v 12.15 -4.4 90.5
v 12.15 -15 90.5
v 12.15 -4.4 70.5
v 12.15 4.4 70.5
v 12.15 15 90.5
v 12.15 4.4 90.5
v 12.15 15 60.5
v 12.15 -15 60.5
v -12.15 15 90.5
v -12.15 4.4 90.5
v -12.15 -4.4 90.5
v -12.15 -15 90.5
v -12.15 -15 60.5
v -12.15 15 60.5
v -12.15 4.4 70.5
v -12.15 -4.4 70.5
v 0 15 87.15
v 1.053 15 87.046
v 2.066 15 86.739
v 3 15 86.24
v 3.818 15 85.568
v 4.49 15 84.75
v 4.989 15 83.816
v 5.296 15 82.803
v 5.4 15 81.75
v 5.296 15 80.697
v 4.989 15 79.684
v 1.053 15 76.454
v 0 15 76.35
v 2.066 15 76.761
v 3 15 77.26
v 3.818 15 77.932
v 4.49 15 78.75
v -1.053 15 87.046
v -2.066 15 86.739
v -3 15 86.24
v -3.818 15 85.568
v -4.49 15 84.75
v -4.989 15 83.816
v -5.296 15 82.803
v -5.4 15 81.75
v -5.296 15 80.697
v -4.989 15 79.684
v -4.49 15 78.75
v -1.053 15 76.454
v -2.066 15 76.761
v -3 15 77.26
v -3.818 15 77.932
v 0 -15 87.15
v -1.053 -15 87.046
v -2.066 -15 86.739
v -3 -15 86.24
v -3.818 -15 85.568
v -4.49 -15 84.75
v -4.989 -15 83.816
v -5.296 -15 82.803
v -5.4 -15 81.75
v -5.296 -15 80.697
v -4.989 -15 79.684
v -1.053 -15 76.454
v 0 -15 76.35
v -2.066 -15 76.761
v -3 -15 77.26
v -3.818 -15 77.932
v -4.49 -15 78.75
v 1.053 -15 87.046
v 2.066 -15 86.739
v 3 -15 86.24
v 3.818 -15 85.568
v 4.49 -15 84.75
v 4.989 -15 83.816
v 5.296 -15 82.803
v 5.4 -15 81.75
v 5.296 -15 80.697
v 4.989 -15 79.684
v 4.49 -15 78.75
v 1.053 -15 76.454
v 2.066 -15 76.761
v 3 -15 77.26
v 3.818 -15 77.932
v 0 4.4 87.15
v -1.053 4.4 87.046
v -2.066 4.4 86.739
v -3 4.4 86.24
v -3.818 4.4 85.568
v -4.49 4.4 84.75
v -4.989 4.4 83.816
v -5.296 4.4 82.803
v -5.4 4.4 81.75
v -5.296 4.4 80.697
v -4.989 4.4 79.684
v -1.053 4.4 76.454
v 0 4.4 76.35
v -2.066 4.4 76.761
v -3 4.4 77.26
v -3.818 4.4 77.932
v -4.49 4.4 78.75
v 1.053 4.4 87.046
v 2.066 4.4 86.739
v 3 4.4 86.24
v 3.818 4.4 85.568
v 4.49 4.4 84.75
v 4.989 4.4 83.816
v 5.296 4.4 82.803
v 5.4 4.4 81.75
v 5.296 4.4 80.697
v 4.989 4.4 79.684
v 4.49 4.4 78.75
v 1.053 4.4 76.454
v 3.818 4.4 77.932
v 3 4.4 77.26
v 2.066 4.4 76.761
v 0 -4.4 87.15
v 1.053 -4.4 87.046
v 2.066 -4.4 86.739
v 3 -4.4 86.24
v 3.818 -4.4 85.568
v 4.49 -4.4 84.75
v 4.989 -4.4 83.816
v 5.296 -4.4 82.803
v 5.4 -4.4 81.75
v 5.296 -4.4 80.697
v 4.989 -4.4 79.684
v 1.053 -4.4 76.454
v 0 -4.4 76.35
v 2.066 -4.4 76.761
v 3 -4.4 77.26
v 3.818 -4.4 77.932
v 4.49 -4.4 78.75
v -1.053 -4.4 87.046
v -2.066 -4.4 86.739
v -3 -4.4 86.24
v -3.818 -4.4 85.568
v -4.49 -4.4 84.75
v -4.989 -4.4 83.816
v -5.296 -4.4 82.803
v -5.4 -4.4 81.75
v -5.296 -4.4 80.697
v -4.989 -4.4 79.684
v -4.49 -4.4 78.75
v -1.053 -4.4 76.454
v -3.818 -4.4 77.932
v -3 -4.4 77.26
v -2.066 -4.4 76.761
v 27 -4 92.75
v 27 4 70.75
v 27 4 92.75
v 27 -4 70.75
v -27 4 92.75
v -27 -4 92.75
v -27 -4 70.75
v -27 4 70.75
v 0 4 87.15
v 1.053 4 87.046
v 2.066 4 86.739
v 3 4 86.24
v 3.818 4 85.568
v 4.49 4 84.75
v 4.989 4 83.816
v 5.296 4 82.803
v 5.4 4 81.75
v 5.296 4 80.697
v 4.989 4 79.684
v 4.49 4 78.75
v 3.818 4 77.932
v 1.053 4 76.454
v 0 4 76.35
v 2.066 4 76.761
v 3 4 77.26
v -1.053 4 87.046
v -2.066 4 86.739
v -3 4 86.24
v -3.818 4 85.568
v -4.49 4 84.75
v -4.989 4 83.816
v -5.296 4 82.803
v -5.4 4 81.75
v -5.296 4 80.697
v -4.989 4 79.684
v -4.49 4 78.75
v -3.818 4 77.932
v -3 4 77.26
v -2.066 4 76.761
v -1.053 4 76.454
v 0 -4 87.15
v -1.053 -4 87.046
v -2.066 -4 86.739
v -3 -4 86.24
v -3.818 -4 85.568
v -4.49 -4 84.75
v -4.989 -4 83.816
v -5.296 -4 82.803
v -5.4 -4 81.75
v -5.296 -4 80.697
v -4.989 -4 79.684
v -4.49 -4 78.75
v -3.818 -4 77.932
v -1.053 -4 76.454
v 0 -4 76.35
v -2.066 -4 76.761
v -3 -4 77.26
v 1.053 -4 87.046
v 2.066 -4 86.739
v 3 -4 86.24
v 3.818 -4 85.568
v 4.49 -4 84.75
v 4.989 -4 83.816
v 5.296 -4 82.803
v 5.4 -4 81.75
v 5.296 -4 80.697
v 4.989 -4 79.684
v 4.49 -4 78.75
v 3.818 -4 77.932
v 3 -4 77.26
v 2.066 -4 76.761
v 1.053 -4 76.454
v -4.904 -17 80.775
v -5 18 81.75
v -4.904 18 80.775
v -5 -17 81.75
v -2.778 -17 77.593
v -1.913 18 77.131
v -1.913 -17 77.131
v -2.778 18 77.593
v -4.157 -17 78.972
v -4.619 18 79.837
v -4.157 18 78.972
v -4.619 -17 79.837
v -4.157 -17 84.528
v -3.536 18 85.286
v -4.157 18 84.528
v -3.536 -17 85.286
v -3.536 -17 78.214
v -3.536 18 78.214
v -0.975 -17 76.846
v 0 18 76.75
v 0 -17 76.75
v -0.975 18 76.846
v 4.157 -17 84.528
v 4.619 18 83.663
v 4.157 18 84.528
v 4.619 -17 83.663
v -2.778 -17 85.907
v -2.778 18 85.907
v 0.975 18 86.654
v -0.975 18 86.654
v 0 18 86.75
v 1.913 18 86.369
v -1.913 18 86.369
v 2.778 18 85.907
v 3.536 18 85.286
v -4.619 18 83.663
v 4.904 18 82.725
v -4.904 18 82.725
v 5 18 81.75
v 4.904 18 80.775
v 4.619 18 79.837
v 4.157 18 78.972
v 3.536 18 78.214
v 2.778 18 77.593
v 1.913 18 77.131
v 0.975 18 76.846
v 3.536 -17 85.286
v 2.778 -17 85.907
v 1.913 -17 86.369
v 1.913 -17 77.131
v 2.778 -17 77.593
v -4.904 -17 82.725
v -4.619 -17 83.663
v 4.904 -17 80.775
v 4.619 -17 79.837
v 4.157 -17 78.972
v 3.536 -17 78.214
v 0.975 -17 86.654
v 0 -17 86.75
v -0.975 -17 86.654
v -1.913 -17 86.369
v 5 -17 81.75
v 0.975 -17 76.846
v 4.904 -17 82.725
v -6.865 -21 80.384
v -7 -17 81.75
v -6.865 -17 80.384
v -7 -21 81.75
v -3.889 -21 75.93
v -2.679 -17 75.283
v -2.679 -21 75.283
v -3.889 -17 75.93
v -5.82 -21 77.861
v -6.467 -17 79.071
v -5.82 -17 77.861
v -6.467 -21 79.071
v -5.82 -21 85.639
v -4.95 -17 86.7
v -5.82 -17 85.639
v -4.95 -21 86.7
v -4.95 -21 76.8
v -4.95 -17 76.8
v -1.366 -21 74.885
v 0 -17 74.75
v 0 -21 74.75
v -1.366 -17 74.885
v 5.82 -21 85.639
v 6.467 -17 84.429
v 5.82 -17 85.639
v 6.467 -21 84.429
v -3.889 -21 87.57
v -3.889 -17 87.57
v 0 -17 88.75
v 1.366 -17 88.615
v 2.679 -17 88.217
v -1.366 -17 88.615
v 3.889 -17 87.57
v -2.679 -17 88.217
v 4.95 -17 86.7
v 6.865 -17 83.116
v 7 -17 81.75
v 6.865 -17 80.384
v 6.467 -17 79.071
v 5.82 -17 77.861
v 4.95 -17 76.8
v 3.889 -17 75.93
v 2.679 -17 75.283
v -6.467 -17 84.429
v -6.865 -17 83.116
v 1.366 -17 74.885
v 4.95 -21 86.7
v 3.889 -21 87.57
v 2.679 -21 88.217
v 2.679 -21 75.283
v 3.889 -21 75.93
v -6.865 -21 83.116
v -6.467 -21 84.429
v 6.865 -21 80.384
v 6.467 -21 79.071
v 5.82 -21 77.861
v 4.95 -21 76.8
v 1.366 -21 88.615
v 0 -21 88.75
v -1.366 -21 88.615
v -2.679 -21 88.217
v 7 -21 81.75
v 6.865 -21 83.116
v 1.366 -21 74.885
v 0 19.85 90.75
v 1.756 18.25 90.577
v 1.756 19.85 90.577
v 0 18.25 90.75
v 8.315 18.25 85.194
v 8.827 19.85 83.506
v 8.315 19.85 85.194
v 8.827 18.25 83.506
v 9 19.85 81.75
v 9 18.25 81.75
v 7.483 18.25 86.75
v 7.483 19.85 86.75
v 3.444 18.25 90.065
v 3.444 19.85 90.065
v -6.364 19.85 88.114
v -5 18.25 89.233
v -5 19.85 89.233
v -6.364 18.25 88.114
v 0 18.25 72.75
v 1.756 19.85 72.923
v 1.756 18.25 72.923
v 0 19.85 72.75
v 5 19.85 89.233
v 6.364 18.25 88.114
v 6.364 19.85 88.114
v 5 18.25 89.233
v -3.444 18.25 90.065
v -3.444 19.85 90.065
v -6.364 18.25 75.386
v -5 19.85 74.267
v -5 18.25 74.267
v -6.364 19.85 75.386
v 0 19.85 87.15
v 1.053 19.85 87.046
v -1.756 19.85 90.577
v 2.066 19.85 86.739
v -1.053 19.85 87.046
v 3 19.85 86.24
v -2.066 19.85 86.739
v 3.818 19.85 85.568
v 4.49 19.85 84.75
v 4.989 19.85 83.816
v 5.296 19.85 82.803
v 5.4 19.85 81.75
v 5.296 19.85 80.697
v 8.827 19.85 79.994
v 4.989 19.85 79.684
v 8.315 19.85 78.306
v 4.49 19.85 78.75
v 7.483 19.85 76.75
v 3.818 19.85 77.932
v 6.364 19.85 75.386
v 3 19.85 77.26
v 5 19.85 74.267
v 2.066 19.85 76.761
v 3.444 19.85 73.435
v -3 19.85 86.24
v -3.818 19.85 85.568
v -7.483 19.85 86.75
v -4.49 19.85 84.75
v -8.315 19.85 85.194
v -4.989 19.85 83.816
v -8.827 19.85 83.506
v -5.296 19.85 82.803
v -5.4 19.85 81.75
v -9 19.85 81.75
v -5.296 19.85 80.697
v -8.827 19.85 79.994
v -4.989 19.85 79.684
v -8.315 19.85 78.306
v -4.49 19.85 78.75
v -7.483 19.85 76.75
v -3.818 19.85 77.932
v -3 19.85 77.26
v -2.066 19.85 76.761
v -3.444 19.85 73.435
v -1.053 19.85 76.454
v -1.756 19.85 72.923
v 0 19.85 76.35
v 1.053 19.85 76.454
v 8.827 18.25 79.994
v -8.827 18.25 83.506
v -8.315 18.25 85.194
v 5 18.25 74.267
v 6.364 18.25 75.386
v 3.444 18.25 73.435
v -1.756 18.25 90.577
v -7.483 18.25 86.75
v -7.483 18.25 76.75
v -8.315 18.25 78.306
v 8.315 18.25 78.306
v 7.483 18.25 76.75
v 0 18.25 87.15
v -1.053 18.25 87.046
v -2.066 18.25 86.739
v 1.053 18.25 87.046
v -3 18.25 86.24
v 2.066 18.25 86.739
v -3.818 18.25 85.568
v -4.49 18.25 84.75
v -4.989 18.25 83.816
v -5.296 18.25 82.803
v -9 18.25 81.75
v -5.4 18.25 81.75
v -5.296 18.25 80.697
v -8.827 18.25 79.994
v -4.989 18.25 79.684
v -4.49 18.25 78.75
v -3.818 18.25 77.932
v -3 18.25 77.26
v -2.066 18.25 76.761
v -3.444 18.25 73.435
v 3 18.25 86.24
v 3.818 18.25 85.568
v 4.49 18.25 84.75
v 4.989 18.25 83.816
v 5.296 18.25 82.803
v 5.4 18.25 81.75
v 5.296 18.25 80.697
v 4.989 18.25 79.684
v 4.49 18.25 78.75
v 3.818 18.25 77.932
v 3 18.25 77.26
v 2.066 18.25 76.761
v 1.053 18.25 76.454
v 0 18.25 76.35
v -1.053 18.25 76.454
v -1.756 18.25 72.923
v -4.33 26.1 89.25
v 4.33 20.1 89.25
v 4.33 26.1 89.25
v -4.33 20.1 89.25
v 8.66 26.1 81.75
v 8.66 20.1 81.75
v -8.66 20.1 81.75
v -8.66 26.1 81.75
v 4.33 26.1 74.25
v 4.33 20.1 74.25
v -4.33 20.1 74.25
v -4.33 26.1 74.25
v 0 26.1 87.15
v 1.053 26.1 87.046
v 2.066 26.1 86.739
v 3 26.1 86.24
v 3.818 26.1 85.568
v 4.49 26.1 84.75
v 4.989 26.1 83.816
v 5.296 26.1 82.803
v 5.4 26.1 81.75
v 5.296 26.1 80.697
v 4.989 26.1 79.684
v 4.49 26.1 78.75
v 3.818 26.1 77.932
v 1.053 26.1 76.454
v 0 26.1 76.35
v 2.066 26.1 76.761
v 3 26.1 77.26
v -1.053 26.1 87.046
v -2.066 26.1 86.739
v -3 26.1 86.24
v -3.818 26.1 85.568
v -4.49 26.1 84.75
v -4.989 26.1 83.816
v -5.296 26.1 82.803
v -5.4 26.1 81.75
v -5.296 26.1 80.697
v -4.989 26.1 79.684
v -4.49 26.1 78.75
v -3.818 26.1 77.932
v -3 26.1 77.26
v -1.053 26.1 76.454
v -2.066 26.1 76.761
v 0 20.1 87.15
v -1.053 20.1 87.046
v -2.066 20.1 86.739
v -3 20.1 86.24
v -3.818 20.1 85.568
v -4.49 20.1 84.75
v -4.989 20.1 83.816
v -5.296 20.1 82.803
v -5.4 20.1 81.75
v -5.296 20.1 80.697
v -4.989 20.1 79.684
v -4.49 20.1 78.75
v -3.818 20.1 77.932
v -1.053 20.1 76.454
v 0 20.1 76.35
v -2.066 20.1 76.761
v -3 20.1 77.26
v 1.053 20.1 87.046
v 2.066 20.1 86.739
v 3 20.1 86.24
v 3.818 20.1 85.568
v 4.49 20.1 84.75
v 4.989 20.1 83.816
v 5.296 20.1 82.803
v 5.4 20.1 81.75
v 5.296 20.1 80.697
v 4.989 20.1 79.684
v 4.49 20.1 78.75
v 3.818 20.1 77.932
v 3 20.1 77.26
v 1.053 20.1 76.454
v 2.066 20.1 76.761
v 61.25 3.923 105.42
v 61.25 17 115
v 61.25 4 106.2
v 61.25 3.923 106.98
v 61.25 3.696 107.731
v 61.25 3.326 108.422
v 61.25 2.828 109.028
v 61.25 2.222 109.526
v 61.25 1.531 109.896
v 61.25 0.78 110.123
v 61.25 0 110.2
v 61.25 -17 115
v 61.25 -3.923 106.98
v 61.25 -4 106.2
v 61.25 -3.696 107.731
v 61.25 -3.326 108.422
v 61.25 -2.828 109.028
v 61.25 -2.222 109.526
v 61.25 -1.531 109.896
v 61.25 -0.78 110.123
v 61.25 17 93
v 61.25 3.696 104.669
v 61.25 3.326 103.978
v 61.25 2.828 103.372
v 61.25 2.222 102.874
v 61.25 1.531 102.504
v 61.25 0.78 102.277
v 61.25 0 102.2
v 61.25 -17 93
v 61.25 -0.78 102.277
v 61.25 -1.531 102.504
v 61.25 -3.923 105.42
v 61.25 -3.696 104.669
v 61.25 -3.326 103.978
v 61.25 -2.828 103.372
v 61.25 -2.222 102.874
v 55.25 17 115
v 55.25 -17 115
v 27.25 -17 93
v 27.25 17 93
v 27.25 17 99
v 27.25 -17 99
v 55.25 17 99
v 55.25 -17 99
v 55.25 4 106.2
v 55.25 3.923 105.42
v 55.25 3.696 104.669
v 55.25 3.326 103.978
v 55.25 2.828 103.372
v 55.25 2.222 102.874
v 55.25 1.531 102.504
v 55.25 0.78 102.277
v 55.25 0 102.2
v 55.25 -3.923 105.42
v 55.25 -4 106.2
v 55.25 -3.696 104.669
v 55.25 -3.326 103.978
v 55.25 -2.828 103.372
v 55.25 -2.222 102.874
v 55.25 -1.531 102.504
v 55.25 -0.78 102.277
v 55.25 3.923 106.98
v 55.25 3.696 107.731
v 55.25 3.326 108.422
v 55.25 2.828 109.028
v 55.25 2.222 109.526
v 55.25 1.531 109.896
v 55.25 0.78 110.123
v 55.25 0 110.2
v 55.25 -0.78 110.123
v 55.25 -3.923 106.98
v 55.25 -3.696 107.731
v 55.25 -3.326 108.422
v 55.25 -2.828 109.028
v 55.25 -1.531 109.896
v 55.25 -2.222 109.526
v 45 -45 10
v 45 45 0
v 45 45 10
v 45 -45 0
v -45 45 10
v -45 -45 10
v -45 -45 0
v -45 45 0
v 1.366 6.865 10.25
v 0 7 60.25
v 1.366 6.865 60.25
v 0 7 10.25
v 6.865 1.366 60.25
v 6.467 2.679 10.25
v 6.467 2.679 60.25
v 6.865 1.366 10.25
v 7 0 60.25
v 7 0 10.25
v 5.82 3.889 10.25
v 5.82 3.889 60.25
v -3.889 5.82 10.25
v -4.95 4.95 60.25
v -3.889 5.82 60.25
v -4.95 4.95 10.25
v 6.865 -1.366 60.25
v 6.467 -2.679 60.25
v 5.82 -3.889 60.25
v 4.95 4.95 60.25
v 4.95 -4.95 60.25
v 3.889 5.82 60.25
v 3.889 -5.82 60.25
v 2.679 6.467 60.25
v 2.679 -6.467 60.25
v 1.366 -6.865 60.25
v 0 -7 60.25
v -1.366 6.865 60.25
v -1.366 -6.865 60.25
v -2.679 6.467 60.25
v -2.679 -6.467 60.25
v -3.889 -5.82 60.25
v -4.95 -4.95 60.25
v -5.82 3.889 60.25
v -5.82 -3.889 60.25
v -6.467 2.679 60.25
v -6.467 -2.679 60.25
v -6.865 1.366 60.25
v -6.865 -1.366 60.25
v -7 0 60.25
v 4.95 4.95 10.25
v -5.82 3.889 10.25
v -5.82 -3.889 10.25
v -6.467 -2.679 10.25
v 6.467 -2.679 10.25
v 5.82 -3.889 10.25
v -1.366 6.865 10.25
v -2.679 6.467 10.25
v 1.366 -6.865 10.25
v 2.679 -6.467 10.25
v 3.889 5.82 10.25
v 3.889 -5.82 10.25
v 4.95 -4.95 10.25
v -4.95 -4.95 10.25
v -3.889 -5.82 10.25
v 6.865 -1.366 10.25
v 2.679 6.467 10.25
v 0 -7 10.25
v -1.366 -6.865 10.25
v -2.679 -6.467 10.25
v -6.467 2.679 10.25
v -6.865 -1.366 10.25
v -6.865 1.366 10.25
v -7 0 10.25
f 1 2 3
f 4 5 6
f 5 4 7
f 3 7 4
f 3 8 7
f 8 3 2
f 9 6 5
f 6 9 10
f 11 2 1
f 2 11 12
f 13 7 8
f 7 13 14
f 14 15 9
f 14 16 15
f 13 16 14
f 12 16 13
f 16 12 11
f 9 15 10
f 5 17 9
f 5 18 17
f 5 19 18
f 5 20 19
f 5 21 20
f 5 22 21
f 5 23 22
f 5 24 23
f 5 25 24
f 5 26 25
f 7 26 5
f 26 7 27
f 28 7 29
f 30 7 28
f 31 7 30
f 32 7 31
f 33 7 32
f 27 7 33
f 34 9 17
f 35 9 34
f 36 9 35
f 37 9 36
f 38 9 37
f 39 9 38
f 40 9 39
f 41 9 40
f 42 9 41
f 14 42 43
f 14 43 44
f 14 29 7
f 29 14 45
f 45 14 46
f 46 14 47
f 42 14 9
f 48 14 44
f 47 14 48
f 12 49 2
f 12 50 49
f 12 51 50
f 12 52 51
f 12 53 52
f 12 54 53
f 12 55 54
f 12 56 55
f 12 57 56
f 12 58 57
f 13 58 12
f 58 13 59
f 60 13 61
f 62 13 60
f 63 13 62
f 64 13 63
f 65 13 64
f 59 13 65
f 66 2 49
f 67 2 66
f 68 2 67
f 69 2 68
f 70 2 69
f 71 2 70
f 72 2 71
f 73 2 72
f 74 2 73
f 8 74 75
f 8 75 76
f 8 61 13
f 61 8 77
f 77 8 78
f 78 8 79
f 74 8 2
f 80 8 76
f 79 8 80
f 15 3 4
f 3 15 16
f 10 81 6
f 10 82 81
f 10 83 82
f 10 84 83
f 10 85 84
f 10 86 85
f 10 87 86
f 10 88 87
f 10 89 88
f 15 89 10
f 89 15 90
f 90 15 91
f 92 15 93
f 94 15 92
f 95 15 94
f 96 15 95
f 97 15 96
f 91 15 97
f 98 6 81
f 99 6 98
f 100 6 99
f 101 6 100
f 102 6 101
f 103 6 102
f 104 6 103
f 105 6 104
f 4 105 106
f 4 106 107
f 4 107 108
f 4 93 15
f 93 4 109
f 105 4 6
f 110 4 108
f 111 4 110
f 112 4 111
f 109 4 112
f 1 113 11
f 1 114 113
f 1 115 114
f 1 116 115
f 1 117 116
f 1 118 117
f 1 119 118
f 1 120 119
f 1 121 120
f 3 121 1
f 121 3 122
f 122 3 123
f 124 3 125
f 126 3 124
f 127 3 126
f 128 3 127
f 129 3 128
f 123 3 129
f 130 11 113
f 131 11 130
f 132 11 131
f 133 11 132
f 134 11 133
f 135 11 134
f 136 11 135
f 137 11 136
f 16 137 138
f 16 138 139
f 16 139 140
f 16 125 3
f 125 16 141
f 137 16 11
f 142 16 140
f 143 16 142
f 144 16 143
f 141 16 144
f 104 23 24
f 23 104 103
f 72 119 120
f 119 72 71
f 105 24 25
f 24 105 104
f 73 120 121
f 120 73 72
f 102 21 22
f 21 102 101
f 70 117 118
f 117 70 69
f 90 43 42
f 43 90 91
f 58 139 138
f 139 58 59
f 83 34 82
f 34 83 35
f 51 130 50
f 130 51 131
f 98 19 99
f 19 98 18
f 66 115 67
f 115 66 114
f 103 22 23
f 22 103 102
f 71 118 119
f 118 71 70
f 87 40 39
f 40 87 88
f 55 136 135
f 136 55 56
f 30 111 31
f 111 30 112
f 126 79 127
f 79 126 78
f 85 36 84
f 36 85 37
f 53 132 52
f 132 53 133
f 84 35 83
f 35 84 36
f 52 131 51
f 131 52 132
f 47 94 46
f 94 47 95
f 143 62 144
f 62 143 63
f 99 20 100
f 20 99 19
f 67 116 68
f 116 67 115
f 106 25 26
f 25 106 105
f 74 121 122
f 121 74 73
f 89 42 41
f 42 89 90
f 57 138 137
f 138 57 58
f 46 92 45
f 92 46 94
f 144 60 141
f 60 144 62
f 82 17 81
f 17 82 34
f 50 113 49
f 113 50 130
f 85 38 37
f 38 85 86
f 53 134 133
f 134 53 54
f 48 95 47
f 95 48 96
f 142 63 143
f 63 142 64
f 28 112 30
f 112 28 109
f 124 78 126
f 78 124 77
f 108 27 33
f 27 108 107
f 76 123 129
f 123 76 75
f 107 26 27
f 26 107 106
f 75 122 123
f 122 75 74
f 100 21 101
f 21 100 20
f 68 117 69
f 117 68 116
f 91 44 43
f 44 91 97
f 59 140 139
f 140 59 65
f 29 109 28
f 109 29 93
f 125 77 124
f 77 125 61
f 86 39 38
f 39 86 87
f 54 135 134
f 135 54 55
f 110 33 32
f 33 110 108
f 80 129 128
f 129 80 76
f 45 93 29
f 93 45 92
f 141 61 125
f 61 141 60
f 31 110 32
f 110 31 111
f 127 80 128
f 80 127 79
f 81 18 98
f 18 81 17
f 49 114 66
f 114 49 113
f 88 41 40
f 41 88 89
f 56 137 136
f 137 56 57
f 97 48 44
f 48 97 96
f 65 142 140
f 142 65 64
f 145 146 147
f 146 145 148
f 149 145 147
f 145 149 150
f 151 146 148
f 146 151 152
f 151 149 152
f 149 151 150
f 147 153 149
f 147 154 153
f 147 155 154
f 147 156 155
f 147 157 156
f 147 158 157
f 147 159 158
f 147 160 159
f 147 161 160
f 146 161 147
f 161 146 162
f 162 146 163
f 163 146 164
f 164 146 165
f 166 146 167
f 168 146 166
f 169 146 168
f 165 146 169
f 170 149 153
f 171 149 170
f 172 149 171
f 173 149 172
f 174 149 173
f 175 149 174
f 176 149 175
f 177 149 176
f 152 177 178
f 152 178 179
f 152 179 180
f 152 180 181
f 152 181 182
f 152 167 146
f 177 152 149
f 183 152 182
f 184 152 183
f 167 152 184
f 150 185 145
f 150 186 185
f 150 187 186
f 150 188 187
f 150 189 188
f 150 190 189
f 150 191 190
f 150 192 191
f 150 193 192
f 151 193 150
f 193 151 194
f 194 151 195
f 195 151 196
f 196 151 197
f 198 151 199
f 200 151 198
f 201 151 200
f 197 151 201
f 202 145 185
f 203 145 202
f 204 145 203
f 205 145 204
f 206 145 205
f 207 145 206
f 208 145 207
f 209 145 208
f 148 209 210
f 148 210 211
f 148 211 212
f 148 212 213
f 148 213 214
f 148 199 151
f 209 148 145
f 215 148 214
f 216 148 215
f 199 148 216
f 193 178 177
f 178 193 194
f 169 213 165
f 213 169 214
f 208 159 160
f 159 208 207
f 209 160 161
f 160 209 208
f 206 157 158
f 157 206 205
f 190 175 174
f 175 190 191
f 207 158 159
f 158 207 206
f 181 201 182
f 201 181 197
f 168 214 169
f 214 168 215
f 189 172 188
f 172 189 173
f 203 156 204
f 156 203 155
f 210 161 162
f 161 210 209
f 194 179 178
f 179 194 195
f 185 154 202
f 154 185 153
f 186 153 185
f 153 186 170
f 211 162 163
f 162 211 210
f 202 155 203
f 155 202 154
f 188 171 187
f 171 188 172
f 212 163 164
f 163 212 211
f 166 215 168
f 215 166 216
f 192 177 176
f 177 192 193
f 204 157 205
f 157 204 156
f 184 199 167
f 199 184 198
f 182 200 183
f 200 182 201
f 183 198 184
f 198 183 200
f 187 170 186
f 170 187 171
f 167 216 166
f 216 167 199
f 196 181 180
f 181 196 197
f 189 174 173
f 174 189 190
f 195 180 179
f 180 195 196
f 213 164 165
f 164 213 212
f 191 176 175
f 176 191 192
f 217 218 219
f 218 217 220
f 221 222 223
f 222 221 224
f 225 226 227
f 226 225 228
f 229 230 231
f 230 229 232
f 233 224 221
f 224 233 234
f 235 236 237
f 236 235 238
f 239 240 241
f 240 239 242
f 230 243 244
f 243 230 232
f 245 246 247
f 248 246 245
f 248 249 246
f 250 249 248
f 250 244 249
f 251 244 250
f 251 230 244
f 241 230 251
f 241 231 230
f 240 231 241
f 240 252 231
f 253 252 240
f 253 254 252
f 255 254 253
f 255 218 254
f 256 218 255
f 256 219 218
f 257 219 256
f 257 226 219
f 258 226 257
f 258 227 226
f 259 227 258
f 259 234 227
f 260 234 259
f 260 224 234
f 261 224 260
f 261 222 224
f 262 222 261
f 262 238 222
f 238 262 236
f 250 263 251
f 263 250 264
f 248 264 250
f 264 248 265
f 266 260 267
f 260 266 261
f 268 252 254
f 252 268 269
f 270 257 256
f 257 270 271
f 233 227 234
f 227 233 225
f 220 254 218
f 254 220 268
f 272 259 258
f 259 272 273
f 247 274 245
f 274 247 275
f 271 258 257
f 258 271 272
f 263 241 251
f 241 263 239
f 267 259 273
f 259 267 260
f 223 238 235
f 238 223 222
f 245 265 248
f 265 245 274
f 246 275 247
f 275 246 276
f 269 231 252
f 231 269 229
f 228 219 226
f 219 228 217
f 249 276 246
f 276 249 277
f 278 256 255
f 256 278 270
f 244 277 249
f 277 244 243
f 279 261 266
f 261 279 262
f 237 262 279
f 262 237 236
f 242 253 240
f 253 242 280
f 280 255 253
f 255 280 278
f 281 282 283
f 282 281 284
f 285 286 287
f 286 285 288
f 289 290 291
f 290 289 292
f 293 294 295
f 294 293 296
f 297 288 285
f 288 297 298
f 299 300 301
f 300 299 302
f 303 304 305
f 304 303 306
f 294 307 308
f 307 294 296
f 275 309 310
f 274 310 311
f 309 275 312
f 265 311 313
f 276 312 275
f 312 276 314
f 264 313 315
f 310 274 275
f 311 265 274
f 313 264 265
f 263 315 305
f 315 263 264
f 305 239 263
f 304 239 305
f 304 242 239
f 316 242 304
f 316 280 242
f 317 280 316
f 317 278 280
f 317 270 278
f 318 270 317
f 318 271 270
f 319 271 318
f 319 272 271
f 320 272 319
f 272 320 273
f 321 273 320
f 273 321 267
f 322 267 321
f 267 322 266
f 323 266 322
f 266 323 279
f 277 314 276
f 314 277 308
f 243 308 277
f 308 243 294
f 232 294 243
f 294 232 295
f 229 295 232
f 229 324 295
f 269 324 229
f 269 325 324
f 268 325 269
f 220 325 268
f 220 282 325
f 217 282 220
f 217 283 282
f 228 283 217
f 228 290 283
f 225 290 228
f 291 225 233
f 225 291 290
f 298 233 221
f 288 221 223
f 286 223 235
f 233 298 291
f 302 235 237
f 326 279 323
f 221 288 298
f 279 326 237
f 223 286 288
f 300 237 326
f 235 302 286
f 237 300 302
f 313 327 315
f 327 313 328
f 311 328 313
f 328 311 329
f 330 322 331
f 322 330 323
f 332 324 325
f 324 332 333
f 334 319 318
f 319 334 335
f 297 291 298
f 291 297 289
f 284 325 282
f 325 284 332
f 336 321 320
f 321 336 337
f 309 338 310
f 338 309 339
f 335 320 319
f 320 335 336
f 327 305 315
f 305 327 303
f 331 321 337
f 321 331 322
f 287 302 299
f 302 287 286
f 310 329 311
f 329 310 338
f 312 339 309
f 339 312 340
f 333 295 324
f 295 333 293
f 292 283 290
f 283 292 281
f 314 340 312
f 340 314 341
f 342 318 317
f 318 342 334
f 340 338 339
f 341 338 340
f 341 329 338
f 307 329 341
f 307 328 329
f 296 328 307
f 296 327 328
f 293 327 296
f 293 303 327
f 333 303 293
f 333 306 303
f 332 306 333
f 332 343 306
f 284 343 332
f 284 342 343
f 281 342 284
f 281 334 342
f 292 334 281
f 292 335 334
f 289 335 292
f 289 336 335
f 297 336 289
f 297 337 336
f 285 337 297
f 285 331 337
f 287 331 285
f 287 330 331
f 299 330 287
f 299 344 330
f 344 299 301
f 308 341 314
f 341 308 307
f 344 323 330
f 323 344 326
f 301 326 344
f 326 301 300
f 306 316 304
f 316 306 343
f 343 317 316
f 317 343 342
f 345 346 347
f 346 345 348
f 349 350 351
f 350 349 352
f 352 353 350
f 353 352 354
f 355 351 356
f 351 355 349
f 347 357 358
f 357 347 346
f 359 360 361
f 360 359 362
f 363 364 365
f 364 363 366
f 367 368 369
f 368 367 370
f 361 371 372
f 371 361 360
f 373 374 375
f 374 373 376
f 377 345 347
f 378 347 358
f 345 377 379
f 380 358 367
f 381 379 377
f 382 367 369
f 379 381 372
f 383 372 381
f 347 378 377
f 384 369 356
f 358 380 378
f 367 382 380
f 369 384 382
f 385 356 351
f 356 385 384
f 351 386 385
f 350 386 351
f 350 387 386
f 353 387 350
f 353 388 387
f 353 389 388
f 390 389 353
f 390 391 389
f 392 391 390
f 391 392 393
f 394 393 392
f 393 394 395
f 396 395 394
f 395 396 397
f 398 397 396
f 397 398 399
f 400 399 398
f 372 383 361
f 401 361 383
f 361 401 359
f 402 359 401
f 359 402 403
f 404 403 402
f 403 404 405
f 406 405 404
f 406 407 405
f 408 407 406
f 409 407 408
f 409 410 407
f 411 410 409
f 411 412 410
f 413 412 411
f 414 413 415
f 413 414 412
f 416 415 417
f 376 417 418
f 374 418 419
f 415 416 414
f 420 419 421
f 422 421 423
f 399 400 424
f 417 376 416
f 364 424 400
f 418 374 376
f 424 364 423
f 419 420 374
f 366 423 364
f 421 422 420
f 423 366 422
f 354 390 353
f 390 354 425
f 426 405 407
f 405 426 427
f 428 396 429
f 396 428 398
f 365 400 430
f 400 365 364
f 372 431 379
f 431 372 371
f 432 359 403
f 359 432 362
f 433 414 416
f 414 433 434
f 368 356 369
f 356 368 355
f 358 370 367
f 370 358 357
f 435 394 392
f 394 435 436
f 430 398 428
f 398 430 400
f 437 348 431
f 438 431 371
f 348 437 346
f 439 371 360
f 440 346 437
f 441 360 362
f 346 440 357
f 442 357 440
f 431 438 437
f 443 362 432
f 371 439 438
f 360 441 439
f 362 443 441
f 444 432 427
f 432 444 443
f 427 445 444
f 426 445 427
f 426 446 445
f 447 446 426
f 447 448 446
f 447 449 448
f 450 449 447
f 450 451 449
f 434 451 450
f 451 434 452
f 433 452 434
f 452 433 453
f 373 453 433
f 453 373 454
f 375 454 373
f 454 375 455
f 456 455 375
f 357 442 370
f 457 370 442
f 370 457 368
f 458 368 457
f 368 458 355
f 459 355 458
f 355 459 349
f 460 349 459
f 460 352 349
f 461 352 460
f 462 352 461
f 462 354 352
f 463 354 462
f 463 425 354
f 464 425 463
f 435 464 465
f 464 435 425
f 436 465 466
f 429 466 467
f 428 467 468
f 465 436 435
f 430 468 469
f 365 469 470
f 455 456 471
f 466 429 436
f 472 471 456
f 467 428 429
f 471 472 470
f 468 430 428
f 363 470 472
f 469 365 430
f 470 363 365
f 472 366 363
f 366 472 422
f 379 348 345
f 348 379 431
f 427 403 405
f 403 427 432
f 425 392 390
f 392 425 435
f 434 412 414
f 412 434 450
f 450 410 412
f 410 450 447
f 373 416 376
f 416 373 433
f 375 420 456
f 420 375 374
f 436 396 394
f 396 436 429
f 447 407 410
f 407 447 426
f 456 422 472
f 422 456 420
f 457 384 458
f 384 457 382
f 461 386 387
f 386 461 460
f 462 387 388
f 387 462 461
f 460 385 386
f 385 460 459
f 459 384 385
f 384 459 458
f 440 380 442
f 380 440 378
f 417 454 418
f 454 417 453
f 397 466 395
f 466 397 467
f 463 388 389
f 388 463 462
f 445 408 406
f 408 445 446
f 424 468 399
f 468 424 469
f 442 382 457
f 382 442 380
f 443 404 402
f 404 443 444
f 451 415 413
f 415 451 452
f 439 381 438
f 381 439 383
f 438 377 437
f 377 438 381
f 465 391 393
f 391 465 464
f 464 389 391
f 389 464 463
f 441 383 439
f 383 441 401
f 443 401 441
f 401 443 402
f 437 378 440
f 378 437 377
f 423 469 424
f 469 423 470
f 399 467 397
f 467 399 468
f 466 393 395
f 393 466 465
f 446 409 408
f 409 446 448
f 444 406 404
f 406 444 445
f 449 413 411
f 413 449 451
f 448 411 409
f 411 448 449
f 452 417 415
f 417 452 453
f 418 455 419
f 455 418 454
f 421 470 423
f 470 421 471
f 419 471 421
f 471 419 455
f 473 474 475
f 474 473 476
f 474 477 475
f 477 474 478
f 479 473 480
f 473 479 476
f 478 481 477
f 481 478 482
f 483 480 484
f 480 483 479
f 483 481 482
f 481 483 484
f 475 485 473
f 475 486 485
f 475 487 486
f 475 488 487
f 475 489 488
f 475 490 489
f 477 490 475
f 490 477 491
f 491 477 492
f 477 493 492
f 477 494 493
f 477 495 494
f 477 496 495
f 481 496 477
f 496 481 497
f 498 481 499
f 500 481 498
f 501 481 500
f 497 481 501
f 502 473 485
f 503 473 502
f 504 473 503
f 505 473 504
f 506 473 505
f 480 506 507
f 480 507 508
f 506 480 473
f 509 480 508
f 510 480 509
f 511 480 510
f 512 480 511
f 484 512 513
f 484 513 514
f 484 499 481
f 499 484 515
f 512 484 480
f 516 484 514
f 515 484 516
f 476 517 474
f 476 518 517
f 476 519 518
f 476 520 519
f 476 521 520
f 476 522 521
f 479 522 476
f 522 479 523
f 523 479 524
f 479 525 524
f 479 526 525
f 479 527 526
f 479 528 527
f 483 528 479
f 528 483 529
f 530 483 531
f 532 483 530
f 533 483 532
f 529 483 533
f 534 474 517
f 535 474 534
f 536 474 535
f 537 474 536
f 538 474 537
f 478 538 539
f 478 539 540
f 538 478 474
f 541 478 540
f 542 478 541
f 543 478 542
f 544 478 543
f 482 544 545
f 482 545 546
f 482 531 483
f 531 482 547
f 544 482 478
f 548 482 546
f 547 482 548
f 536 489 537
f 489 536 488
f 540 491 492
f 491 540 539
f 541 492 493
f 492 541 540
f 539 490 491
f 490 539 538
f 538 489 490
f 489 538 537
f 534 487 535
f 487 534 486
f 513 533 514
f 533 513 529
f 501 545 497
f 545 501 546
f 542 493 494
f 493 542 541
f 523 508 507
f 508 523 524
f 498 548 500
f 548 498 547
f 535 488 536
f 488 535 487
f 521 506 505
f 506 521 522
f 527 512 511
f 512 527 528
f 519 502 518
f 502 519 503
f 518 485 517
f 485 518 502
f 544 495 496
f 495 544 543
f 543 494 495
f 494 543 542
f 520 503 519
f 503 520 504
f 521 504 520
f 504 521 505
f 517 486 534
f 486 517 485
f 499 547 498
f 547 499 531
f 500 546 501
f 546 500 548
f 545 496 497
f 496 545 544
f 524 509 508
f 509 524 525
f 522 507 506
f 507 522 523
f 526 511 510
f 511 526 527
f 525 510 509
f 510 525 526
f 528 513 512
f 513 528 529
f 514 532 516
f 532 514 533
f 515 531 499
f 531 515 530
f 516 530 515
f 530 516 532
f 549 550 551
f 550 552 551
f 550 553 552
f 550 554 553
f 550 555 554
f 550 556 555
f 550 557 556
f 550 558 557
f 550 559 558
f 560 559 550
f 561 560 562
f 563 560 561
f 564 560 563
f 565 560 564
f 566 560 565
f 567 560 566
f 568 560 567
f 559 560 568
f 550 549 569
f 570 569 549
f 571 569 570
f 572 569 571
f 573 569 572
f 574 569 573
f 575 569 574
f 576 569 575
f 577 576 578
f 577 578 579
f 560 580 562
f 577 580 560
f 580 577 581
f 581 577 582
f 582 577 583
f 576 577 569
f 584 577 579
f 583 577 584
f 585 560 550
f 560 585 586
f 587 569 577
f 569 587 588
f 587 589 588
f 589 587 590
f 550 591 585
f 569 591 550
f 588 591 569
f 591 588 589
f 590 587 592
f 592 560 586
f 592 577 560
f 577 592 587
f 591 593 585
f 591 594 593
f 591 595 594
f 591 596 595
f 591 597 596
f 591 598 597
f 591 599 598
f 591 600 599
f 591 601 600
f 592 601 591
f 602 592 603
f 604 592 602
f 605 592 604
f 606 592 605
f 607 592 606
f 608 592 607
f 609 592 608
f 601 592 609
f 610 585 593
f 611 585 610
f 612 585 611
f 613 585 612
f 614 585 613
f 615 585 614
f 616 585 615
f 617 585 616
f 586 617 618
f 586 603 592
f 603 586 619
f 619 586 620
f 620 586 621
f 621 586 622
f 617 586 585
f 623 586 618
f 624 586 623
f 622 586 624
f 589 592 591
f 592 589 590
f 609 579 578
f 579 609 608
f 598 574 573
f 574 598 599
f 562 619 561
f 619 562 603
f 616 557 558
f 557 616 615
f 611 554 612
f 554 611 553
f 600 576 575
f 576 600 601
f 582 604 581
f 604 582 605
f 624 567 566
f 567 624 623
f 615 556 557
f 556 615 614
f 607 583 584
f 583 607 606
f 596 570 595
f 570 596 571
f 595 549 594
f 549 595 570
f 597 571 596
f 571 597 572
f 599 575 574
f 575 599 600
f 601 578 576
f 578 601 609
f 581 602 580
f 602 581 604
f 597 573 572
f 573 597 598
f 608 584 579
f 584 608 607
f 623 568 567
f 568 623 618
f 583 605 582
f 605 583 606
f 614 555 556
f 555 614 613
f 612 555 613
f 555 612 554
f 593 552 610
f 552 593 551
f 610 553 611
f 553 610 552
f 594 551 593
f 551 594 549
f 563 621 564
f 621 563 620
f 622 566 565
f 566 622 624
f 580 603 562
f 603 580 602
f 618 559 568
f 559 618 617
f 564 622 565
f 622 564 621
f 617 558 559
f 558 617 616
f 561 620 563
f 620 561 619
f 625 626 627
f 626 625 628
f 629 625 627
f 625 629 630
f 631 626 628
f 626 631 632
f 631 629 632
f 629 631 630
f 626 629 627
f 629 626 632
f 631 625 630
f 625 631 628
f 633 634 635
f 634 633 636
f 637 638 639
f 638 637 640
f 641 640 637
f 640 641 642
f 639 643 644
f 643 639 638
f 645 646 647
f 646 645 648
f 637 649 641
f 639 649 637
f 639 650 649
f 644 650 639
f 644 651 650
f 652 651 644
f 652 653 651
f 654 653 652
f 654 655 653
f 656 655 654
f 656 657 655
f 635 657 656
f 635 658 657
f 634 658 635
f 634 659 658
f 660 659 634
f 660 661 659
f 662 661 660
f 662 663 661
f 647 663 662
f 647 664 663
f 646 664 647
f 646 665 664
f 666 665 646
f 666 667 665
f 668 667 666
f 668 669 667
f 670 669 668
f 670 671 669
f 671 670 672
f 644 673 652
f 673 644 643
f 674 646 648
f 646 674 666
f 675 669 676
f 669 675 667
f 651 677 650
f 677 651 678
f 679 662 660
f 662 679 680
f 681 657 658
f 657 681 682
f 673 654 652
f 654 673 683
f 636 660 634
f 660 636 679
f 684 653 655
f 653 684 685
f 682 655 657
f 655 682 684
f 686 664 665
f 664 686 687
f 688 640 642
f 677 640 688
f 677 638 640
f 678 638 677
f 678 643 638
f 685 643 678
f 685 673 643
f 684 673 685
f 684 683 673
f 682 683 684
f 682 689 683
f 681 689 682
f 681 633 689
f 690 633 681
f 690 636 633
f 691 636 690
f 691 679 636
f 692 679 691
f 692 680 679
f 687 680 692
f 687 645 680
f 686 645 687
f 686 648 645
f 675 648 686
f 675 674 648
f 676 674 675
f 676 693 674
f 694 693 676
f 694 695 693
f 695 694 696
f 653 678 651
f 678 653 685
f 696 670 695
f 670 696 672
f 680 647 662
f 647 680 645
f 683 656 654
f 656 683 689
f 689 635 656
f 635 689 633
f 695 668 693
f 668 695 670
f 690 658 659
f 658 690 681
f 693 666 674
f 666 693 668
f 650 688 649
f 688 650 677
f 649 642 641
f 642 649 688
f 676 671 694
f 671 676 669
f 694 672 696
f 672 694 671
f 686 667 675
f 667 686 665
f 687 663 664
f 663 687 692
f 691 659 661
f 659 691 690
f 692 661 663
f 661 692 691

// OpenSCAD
$fn = 32;

// ------------------------------------------------------------------------
// Lamp arm: column d14 x 50 mm, arm 54 mm
// Every part is its own module, assembly() places every instance.
// ------------------------------------------------------------------------

// --- part 1 ---
module lamp_base() {
  difference() {
    translate([-45, -45, 0]) cube([90, 90, 10]);
  }
}

// --- part 2 ---
module lamp_column() {
  cylinder(h = 50, d = 14);
}

// --- part 3 ---
module head_fork() {
  difference() {
    translate([-12.15, -15, 0]) cube([24.3, 30, 30]);
    translate([-13.15, -4.4, 10]) cube([26.3, 8.8, 21]);
    translate([0, 0, 21.25]) rotate([90, 0, 0]) cylinder(h = 32, d = 10.8, center = true);
  }
}

// --- part 4 ---
module lamp_arm() {
  difference() {
    translate([-27, -4, 0]) cube([54, 8, 22]);
    translate([0, 0, 11]) rotate([90, 0, 0]) cylinder(h = 10, d = 10.8, center = true);
  }
}

// --- part 5 ---
module arm_pin() {
  rotate([0, 90, 0]) cylinder(h = 36, d = 10, center = true);
  translate([-21, 0, 0]) rotate([0, 90, 0]) cylinder(h = 4, d = 14);
}

// --- part 6 ---
module arm_washer() {
  difference() {
      translate([0, 0, 0]) cylinder(h = 1.6, d = 18);
      translate([0, 0, -1]) cylinder(h = 3.6, d = 10.8);
    }
}

// --- part 7 ---
module arm_nut() {
  difference() {
    linear_extrude(height = 6) polygon(points = [[8.66, 0], [4.33, 7.5], [-4.33, 7.5], [-8.66, 0], [-4.33, -7.5], [4.33, -7.5]]);
    translate([0, 0, -1]) cylinder(h = 8, d = 10.8);
  }
}

// --- part 8 ---
module shade_bracket() {
  difference() {
    translate([-17, -17, 0]) cube([34, 34, 22]);
    translate([-18, -18, 6]) cube([29, 36, 17]);
    translate([14, 0, 13.2]) rotate([0, 90, 0]) cylinder(h = 8, d = 8, center = true);
  }
}

// --- assembly ---
module assembly() {
  color([0.80, 0.24, 0.20]) translate([0, 0, 0]) rotate([0, 0, 0]) lamp_base();
  color([0.20, 0.45, 0.75]) translate([0, 0, 10.25]) rotate([0, 0, 0]) lamp_column();
  color([0.25, 0.62, 0.32]) translate([0, 0, 60.5]) rotate([0, 0, 0]) head_fork();
  color([0.92, 0.70, 0.18]) translate([0, 0, 70.75]) rotate([0, 0, 0]) lamp_arm();
  color([0.58, 0.35, 0.70]) translate([0, 0, 81.75]) rotate([0, 0, 90]) arm_pin();
  color([0.16, 0.66, 0.66]) translate([0, 19.85, 81.75]) rotate([90, 0, 0]) arm_washer();
  color([0.85, 0.48, 0.18]) translate([0, 26.1, 81.75]) rotate([90, 0, 0]) arm_nut();
  color([0.55, 0.60, 0.65]) translate([44.25, 0, 93]) rotate([0, 0, 0]) shade_bracket();
}

assembly();
